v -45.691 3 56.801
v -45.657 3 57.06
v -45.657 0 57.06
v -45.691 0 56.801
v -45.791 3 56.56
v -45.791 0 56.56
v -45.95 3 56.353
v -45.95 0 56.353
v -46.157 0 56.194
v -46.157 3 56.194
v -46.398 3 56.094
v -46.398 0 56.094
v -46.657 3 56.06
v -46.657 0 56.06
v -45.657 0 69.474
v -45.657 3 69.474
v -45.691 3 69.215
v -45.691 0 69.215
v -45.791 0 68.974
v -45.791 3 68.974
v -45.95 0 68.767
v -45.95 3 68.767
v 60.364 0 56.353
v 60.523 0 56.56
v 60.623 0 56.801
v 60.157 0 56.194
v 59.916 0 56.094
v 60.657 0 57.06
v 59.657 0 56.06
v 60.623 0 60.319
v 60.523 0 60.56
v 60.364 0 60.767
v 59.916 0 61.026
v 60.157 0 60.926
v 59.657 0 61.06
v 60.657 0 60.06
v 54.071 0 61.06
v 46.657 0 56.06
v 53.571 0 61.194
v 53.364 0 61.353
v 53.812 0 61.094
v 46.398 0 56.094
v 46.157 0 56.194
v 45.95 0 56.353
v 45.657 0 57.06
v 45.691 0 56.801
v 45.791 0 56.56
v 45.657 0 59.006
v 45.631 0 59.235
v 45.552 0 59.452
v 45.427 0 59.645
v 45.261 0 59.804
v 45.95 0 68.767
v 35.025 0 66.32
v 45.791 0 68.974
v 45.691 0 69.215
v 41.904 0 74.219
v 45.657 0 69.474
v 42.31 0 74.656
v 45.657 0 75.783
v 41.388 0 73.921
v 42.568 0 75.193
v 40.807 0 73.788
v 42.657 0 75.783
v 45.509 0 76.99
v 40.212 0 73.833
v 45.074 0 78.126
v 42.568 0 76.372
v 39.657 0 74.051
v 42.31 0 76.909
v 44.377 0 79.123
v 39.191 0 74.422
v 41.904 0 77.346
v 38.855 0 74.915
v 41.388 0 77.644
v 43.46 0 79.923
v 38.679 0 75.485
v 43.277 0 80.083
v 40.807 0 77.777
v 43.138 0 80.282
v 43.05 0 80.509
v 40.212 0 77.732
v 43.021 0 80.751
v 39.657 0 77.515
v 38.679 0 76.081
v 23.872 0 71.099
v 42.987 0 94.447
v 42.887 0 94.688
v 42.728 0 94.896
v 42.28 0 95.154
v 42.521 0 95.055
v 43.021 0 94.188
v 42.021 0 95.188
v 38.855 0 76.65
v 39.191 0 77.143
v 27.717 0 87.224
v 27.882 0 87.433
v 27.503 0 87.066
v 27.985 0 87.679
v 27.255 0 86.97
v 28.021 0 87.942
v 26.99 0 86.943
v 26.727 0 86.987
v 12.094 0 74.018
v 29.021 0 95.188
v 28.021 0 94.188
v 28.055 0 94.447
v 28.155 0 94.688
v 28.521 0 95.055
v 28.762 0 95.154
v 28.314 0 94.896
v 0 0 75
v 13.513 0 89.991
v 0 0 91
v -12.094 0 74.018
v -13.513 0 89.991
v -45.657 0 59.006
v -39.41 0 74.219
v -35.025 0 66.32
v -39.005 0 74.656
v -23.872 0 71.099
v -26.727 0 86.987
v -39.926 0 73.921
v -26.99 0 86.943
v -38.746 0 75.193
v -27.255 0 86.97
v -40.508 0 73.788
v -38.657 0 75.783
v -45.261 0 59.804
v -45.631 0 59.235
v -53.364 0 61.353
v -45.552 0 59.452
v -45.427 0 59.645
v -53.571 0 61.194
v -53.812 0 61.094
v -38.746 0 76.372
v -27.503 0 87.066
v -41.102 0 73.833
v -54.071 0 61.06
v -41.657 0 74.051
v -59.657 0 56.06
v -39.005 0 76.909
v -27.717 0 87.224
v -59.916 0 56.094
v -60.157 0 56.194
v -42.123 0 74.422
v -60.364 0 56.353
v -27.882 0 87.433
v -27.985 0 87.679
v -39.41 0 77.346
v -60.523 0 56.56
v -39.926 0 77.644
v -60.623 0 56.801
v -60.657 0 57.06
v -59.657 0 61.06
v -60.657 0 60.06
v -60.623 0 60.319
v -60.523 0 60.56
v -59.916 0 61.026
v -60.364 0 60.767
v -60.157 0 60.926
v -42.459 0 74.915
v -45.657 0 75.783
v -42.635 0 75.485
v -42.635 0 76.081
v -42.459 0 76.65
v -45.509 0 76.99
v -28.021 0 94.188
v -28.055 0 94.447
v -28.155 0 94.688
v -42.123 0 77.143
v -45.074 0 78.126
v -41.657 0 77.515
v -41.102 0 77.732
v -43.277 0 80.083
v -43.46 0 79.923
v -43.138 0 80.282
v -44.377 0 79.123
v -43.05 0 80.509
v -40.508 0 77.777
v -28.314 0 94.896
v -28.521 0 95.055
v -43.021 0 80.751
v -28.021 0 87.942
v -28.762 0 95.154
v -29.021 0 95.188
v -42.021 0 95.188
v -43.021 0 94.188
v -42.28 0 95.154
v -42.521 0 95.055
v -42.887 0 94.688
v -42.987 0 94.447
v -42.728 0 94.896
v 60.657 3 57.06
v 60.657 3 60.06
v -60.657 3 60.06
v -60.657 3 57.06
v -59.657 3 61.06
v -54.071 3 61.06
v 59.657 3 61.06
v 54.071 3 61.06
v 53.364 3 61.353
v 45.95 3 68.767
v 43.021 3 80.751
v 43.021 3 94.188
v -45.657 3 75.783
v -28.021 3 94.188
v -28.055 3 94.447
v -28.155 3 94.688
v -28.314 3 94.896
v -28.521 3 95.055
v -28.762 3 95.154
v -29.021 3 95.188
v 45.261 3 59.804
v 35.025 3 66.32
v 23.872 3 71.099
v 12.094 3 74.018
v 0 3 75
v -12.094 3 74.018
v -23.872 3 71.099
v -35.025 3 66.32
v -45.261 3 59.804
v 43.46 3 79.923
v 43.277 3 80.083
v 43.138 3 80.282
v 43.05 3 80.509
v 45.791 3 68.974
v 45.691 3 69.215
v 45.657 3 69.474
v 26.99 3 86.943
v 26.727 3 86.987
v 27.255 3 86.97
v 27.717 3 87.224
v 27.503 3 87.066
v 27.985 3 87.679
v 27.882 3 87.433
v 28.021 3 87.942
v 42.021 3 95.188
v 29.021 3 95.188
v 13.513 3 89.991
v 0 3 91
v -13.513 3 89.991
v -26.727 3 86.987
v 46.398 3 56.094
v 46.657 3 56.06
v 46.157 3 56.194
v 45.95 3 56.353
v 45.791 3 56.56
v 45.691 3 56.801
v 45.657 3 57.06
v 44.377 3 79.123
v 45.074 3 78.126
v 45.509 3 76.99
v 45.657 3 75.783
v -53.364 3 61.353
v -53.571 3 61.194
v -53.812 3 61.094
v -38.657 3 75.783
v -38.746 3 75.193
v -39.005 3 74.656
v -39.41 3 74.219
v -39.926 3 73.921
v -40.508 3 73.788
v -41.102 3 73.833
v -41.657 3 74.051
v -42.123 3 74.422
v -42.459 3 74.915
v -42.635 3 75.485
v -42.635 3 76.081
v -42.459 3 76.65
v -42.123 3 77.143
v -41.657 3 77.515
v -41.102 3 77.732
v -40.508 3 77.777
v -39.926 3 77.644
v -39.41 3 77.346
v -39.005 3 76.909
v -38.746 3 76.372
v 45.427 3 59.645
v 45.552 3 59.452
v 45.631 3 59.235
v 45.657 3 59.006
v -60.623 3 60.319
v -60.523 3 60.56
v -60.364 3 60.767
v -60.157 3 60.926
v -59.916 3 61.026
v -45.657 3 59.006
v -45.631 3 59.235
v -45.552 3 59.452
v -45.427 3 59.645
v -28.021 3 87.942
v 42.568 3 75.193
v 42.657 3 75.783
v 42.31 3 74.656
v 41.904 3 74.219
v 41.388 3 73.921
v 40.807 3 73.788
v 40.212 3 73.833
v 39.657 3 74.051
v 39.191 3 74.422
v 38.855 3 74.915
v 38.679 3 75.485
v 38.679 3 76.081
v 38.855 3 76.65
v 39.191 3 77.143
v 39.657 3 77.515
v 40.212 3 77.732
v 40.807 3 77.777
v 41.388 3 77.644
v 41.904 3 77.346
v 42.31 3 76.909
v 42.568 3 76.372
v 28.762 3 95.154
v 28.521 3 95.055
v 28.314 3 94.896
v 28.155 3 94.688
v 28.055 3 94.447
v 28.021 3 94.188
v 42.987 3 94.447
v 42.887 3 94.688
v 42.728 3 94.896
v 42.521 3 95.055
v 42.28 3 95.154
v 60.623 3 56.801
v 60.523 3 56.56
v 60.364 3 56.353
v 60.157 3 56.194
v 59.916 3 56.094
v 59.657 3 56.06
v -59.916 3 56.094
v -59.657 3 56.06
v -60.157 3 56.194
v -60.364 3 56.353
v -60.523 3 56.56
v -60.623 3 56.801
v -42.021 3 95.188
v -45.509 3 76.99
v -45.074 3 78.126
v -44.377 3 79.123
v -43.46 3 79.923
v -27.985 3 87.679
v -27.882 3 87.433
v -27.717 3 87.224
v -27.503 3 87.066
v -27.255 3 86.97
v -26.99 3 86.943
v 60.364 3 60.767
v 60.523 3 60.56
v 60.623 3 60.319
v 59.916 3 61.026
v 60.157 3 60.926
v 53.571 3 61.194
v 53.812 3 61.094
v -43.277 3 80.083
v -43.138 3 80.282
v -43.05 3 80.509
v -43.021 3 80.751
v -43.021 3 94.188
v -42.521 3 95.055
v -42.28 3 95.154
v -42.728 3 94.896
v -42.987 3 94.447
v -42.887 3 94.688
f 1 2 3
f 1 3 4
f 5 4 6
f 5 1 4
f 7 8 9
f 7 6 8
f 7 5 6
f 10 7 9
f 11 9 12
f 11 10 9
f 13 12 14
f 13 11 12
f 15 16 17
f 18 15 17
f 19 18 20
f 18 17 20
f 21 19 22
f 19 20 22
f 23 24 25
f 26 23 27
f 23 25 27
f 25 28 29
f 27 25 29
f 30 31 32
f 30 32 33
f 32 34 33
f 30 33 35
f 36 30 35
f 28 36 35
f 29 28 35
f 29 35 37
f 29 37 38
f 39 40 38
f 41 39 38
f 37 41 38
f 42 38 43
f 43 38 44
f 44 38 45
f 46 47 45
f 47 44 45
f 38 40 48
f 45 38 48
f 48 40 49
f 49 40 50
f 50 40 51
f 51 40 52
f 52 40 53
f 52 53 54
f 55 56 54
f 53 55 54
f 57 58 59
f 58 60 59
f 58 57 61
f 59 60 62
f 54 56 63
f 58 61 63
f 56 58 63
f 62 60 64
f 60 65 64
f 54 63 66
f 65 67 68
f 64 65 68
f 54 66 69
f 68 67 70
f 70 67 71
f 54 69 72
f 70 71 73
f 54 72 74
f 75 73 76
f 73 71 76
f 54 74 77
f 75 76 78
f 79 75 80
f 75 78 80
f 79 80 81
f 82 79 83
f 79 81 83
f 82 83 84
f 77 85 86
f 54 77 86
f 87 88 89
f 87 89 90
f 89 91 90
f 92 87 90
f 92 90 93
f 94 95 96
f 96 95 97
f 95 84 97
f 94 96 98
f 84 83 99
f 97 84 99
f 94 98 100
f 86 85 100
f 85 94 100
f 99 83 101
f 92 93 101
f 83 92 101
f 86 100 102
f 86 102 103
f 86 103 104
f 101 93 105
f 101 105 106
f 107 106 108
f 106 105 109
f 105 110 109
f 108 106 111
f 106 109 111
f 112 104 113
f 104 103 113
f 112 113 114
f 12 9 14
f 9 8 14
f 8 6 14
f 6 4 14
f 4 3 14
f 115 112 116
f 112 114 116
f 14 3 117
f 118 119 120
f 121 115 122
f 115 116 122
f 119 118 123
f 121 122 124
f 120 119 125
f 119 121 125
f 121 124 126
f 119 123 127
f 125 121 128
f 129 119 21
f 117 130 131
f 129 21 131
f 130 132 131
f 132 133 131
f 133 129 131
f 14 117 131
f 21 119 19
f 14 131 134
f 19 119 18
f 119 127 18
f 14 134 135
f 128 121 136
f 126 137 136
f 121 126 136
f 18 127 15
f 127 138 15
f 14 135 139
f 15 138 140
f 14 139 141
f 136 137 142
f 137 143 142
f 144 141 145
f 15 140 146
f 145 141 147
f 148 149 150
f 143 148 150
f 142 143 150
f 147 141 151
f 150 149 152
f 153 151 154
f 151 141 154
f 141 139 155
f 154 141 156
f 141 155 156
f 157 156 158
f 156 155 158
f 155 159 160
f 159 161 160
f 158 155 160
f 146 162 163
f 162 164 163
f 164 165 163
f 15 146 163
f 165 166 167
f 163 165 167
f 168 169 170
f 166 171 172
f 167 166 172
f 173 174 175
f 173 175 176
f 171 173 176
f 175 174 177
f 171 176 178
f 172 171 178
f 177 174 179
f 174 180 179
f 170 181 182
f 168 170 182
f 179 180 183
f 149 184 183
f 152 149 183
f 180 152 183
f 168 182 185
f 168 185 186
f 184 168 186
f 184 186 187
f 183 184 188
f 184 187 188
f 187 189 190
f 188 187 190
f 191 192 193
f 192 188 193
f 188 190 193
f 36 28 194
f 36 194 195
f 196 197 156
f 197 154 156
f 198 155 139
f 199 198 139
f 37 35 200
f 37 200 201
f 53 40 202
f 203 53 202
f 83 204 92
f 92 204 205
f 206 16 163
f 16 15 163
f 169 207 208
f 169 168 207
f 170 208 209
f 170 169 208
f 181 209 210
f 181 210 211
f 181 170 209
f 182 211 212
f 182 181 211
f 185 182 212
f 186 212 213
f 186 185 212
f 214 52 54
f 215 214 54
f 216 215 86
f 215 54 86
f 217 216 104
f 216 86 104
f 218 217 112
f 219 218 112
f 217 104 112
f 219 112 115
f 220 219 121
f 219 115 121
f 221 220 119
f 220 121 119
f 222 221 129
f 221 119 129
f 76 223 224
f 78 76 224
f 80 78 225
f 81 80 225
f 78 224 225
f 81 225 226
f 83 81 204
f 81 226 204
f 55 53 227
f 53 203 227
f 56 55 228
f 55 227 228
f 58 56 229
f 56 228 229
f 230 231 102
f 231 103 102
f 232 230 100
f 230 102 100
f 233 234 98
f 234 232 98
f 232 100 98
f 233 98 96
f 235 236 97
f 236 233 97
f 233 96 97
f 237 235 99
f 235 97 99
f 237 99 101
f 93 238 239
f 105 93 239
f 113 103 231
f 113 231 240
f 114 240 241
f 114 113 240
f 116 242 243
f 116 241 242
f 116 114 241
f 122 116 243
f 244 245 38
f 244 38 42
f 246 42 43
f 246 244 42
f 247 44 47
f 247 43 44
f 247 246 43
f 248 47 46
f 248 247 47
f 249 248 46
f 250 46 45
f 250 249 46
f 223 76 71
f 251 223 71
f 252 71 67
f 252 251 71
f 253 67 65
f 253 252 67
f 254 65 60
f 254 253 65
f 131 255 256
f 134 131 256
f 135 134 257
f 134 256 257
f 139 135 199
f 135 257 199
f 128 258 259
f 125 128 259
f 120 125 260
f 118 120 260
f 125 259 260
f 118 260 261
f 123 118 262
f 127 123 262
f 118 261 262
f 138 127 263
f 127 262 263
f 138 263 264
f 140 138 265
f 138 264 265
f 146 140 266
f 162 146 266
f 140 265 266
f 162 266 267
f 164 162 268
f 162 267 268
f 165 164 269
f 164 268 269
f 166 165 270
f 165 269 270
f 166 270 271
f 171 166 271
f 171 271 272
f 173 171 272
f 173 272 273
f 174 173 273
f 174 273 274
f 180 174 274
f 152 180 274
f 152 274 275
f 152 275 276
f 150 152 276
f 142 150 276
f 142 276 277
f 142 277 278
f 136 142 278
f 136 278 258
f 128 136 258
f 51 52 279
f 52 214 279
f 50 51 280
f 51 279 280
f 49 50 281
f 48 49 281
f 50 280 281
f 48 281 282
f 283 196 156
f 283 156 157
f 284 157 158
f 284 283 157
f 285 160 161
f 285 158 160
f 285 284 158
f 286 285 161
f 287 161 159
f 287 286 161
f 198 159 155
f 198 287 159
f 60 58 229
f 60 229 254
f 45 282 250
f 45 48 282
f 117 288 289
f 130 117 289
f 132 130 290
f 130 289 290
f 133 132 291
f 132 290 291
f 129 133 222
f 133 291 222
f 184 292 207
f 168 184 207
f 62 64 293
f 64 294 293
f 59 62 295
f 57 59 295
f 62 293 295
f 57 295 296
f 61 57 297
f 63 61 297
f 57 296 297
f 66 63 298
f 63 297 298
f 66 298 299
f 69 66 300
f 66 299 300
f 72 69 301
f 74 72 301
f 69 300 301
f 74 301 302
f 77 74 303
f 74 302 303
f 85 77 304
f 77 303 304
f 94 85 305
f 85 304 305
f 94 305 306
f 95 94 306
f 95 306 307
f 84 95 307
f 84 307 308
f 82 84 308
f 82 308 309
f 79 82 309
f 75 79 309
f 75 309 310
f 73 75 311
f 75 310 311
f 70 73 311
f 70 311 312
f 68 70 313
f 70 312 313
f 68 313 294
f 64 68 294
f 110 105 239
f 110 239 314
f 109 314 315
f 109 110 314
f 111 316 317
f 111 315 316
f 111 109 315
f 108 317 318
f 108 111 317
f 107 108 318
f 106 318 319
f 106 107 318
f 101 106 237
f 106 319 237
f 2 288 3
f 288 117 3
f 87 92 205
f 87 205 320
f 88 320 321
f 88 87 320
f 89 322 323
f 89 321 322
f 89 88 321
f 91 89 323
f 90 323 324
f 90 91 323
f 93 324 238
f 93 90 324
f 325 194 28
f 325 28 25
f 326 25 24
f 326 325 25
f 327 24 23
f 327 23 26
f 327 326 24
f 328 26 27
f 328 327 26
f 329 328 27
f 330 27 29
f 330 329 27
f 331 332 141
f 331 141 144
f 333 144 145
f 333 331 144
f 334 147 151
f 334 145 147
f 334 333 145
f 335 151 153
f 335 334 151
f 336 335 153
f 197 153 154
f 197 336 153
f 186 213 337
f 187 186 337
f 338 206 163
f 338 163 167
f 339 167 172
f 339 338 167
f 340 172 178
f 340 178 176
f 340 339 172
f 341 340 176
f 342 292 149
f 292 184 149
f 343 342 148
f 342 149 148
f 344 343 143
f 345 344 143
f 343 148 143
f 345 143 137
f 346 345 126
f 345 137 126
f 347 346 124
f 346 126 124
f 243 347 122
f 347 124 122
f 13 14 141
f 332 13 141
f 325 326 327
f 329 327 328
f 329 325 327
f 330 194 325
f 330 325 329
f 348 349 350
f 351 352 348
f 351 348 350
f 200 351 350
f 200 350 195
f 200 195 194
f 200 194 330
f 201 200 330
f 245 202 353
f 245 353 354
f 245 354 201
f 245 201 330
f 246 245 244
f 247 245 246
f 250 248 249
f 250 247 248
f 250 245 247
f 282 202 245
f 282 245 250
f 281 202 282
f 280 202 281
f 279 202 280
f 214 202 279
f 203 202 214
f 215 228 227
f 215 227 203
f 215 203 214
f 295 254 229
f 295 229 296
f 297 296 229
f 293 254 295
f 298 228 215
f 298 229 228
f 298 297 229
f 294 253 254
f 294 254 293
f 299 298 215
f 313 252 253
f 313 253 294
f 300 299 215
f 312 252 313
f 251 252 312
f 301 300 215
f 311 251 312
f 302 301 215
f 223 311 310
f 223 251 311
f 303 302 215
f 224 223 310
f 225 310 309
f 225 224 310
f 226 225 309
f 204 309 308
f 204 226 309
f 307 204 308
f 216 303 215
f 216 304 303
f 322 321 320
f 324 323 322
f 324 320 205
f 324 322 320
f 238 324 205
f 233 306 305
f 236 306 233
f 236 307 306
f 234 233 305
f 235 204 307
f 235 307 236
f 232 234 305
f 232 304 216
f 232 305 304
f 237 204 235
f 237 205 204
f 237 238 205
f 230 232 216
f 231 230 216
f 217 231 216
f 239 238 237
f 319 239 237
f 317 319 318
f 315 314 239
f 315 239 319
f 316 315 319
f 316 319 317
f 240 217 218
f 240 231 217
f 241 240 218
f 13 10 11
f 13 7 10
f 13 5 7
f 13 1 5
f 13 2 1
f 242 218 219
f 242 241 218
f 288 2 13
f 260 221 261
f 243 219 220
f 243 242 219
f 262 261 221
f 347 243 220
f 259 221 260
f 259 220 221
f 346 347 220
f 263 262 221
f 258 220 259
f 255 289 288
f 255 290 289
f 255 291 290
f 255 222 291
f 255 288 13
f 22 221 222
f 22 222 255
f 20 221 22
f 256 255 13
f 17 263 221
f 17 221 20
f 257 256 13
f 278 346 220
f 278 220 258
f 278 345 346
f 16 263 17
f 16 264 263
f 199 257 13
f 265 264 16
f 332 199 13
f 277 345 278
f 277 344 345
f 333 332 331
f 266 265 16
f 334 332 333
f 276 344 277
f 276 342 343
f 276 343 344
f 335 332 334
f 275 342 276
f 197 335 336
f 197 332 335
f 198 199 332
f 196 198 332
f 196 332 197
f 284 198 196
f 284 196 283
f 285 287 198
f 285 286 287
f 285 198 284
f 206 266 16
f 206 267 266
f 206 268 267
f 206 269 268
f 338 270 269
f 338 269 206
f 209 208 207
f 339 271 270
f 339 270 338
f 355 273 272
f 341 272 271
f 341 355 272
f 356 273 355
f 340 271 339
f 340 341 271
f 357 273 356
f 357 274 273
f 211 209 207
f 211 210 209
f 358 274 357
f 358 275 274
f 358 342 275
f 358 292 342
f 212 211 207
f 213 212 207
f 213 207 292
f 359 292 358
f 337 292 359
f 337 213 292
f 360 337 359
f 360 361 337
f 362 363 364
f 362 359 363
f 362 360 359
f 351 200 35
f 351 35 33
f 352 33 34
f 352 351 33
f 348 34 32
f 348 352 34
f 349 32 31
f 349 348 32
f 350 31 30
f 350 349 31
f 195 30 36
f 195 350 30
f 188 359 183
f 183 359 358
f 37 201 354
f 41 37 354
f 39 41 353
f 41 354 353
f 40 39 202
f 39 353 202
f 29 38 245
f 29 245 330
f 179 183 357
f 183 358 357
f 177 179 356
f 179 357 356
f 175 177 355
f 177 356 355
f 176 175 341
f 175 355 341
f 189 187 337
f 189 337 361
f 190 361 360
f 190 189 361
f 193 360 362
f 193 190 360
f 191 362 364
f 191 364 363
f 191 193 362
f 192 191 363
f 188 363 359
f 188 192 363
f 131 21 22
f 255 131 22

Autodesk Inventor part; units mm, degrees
ref_plane "YZ Plane" through (0, 0, 0) normal (1, 0, 0) x (0, 1, 0)
ref_plane "XZ Plane" through (0, 0, 0) normal (0, 1, 0) x (-1, 0, 0)
ref_plane "XY Plane" through (0, 0, 0) normal (0, 0, 1) x (1, 0, 0)
sketch "Sketch1" plane through (0, 0, 0) normal (0, 1, 0) x (-1, 0, 0)
  circle A0 centre (0, 0) radius 75
  line L0 (0, 0) -> (45.6571, 59.5015)
  line L1 (0, 0) -> (-45.6571, 59.5015)
  line L2 (0, 0) -> (0, 75)
  circle A1 centre (0, 0) radius 72.3
  circle A2 centre (0, 0) radius 91
  line L3 (45.6571, 59.5015) -> (45.6571, 56.06)
  line L4 (45.6571, 56.06) -> (60.6571, 56.06)
  line L5 (45.6571, 59.5015) -> (45.6571, 78.7174)
  line L6 (60.6571, 56.06) -> (60.6571, 61.06)
  line L7 (60.6571, 61.06) -> (45.6571, 61.06)
  line L8 (-45.6571, 59.5015) -> (-45.6571, 56.06)
  line L9 (-45.6571, 56.06) -> (-60.6571, 56.06)
  line L10 (-45.6571, 59.5015) -> (-45.6571, 78.7174)
  line L11 (-60.6571, 56.06) -> (-60.6571, 61.06)
  line L12 (-60.6571, 61.06) -> (-45.6571, 61.06)
  point P0 (44.0135, 57.3594)
  point P1 (-44.0135, 57.3594)
  dimension "d0" = 150
  dimension "d1" = 37.5
  dimension "d2" = 37.5
  dimension "d3" = 2.7
  dimension "d9" = 16
  dimension "d21" = 15
  dimension "d22" = 5
extrude "Extrusion1" add sketch "Sketch1" along normal blind 3 contours L5 L7 L6 L4 A0 | A0 L4 L3 | A0 L10 A2 L5 | L8 L9 A0 | A0 L9 L11 L12 L10
fillet "Fillet2" radius 5 2 edges at (-45.6571, 1.5, 78.7174) (45.6571, 1.5, 78.7174)
sketch "Sketch2" plane through (0, 3, 0) normal (0, 1, 0) x (1, 0, 0)
  circle A0 centre (-40.6571, -75.7826) radius 2
  circle A1 centre (40.6571, -75.7826) radius 2
  arc A2 (43.0209, -80.1885) -> (45.6571, -75.7826) centre (40.6571, -75.7826) ccw projected
  arc A3 (-45.6571, -75.7826) -> (-43.0209, -80.1885) centre (-40.6571, -75.7826) ccw projected
  point P0 (0, 0)
  dimension "d17" = 4
  dimension "d18" = 4
extrude "Extrusion2" cut sketch "Sketch2" against normal blind 3
fillet "Fillet5" radius 1 8 edges at (45.6571, 1.5, 56.06) (45.6571, 1.5, 59.5015) (60.6571, 1.5, 56.06) (60.6571, 1.5, 61.06) (-45.6571, 1.5, 56.06) (-45.6571, 1.5, 59.5015) (-60.6571, 1.5, 56.06) (-60.6571, 1.5, 61.06)
chamfer "Chamfer1" distance 8 angle 45 2 edges at (-45.6571, 1.5, 61.06) (45.6571, 1.5, 61.06)
fillet "Fillet7" radius 1 4 edges at (-53.6571, 1.5, 61.06) (-45.6571, 1.5, 69.06) (45.6571, 1.5, 69.06) (53.6571, 1.5, 61.06)
sketch "Sketch3" plane through (0, 3, 0) normal (0, 1, 0) x (1, 0, 0)
  arc A0 (-45.6571, -75.7826) -> (-43.0209, -80.1885) centre (-40.6571, -75.7826) ccw projected
  line L0 (-43.0209, -80.1885) -> (-28.0209, -80.1885)
  line L1 (-28.0209, -80.1885) -> (-28.0209, -95.1885)
  line L2 (-28.0209, -95.1885) -> (-43.0209, -95.1885)
  line L3 (-43.0209, -95.1885) -> (-43.0209, -80.1885)
  point P0 (0, 0)
  point P1 (-35.5209, -80.1885)
  dimension "d31" = 15
  dimension "d32" = 15
extrude "Extrusion3" add sketch "Sketch3" against normal blind 3
fillet "Fillet8" radius 1 3 edges at (-43.0209, 1.5, 80.1885) (-43.0209, 1.5, 95.1885) (-28.0209, 1.5, 95.1885)
fillet "Fillet9" radius 1 1 edges at (-28.0209, 1.5, 86.5785)
mirror "Mirror1" about plane through (0, 0, 0) normal (1, 0, 0) of "Extrusion3", "Fillet8", "Fillet9"
properties part number "Parte B bastantes piezas"
